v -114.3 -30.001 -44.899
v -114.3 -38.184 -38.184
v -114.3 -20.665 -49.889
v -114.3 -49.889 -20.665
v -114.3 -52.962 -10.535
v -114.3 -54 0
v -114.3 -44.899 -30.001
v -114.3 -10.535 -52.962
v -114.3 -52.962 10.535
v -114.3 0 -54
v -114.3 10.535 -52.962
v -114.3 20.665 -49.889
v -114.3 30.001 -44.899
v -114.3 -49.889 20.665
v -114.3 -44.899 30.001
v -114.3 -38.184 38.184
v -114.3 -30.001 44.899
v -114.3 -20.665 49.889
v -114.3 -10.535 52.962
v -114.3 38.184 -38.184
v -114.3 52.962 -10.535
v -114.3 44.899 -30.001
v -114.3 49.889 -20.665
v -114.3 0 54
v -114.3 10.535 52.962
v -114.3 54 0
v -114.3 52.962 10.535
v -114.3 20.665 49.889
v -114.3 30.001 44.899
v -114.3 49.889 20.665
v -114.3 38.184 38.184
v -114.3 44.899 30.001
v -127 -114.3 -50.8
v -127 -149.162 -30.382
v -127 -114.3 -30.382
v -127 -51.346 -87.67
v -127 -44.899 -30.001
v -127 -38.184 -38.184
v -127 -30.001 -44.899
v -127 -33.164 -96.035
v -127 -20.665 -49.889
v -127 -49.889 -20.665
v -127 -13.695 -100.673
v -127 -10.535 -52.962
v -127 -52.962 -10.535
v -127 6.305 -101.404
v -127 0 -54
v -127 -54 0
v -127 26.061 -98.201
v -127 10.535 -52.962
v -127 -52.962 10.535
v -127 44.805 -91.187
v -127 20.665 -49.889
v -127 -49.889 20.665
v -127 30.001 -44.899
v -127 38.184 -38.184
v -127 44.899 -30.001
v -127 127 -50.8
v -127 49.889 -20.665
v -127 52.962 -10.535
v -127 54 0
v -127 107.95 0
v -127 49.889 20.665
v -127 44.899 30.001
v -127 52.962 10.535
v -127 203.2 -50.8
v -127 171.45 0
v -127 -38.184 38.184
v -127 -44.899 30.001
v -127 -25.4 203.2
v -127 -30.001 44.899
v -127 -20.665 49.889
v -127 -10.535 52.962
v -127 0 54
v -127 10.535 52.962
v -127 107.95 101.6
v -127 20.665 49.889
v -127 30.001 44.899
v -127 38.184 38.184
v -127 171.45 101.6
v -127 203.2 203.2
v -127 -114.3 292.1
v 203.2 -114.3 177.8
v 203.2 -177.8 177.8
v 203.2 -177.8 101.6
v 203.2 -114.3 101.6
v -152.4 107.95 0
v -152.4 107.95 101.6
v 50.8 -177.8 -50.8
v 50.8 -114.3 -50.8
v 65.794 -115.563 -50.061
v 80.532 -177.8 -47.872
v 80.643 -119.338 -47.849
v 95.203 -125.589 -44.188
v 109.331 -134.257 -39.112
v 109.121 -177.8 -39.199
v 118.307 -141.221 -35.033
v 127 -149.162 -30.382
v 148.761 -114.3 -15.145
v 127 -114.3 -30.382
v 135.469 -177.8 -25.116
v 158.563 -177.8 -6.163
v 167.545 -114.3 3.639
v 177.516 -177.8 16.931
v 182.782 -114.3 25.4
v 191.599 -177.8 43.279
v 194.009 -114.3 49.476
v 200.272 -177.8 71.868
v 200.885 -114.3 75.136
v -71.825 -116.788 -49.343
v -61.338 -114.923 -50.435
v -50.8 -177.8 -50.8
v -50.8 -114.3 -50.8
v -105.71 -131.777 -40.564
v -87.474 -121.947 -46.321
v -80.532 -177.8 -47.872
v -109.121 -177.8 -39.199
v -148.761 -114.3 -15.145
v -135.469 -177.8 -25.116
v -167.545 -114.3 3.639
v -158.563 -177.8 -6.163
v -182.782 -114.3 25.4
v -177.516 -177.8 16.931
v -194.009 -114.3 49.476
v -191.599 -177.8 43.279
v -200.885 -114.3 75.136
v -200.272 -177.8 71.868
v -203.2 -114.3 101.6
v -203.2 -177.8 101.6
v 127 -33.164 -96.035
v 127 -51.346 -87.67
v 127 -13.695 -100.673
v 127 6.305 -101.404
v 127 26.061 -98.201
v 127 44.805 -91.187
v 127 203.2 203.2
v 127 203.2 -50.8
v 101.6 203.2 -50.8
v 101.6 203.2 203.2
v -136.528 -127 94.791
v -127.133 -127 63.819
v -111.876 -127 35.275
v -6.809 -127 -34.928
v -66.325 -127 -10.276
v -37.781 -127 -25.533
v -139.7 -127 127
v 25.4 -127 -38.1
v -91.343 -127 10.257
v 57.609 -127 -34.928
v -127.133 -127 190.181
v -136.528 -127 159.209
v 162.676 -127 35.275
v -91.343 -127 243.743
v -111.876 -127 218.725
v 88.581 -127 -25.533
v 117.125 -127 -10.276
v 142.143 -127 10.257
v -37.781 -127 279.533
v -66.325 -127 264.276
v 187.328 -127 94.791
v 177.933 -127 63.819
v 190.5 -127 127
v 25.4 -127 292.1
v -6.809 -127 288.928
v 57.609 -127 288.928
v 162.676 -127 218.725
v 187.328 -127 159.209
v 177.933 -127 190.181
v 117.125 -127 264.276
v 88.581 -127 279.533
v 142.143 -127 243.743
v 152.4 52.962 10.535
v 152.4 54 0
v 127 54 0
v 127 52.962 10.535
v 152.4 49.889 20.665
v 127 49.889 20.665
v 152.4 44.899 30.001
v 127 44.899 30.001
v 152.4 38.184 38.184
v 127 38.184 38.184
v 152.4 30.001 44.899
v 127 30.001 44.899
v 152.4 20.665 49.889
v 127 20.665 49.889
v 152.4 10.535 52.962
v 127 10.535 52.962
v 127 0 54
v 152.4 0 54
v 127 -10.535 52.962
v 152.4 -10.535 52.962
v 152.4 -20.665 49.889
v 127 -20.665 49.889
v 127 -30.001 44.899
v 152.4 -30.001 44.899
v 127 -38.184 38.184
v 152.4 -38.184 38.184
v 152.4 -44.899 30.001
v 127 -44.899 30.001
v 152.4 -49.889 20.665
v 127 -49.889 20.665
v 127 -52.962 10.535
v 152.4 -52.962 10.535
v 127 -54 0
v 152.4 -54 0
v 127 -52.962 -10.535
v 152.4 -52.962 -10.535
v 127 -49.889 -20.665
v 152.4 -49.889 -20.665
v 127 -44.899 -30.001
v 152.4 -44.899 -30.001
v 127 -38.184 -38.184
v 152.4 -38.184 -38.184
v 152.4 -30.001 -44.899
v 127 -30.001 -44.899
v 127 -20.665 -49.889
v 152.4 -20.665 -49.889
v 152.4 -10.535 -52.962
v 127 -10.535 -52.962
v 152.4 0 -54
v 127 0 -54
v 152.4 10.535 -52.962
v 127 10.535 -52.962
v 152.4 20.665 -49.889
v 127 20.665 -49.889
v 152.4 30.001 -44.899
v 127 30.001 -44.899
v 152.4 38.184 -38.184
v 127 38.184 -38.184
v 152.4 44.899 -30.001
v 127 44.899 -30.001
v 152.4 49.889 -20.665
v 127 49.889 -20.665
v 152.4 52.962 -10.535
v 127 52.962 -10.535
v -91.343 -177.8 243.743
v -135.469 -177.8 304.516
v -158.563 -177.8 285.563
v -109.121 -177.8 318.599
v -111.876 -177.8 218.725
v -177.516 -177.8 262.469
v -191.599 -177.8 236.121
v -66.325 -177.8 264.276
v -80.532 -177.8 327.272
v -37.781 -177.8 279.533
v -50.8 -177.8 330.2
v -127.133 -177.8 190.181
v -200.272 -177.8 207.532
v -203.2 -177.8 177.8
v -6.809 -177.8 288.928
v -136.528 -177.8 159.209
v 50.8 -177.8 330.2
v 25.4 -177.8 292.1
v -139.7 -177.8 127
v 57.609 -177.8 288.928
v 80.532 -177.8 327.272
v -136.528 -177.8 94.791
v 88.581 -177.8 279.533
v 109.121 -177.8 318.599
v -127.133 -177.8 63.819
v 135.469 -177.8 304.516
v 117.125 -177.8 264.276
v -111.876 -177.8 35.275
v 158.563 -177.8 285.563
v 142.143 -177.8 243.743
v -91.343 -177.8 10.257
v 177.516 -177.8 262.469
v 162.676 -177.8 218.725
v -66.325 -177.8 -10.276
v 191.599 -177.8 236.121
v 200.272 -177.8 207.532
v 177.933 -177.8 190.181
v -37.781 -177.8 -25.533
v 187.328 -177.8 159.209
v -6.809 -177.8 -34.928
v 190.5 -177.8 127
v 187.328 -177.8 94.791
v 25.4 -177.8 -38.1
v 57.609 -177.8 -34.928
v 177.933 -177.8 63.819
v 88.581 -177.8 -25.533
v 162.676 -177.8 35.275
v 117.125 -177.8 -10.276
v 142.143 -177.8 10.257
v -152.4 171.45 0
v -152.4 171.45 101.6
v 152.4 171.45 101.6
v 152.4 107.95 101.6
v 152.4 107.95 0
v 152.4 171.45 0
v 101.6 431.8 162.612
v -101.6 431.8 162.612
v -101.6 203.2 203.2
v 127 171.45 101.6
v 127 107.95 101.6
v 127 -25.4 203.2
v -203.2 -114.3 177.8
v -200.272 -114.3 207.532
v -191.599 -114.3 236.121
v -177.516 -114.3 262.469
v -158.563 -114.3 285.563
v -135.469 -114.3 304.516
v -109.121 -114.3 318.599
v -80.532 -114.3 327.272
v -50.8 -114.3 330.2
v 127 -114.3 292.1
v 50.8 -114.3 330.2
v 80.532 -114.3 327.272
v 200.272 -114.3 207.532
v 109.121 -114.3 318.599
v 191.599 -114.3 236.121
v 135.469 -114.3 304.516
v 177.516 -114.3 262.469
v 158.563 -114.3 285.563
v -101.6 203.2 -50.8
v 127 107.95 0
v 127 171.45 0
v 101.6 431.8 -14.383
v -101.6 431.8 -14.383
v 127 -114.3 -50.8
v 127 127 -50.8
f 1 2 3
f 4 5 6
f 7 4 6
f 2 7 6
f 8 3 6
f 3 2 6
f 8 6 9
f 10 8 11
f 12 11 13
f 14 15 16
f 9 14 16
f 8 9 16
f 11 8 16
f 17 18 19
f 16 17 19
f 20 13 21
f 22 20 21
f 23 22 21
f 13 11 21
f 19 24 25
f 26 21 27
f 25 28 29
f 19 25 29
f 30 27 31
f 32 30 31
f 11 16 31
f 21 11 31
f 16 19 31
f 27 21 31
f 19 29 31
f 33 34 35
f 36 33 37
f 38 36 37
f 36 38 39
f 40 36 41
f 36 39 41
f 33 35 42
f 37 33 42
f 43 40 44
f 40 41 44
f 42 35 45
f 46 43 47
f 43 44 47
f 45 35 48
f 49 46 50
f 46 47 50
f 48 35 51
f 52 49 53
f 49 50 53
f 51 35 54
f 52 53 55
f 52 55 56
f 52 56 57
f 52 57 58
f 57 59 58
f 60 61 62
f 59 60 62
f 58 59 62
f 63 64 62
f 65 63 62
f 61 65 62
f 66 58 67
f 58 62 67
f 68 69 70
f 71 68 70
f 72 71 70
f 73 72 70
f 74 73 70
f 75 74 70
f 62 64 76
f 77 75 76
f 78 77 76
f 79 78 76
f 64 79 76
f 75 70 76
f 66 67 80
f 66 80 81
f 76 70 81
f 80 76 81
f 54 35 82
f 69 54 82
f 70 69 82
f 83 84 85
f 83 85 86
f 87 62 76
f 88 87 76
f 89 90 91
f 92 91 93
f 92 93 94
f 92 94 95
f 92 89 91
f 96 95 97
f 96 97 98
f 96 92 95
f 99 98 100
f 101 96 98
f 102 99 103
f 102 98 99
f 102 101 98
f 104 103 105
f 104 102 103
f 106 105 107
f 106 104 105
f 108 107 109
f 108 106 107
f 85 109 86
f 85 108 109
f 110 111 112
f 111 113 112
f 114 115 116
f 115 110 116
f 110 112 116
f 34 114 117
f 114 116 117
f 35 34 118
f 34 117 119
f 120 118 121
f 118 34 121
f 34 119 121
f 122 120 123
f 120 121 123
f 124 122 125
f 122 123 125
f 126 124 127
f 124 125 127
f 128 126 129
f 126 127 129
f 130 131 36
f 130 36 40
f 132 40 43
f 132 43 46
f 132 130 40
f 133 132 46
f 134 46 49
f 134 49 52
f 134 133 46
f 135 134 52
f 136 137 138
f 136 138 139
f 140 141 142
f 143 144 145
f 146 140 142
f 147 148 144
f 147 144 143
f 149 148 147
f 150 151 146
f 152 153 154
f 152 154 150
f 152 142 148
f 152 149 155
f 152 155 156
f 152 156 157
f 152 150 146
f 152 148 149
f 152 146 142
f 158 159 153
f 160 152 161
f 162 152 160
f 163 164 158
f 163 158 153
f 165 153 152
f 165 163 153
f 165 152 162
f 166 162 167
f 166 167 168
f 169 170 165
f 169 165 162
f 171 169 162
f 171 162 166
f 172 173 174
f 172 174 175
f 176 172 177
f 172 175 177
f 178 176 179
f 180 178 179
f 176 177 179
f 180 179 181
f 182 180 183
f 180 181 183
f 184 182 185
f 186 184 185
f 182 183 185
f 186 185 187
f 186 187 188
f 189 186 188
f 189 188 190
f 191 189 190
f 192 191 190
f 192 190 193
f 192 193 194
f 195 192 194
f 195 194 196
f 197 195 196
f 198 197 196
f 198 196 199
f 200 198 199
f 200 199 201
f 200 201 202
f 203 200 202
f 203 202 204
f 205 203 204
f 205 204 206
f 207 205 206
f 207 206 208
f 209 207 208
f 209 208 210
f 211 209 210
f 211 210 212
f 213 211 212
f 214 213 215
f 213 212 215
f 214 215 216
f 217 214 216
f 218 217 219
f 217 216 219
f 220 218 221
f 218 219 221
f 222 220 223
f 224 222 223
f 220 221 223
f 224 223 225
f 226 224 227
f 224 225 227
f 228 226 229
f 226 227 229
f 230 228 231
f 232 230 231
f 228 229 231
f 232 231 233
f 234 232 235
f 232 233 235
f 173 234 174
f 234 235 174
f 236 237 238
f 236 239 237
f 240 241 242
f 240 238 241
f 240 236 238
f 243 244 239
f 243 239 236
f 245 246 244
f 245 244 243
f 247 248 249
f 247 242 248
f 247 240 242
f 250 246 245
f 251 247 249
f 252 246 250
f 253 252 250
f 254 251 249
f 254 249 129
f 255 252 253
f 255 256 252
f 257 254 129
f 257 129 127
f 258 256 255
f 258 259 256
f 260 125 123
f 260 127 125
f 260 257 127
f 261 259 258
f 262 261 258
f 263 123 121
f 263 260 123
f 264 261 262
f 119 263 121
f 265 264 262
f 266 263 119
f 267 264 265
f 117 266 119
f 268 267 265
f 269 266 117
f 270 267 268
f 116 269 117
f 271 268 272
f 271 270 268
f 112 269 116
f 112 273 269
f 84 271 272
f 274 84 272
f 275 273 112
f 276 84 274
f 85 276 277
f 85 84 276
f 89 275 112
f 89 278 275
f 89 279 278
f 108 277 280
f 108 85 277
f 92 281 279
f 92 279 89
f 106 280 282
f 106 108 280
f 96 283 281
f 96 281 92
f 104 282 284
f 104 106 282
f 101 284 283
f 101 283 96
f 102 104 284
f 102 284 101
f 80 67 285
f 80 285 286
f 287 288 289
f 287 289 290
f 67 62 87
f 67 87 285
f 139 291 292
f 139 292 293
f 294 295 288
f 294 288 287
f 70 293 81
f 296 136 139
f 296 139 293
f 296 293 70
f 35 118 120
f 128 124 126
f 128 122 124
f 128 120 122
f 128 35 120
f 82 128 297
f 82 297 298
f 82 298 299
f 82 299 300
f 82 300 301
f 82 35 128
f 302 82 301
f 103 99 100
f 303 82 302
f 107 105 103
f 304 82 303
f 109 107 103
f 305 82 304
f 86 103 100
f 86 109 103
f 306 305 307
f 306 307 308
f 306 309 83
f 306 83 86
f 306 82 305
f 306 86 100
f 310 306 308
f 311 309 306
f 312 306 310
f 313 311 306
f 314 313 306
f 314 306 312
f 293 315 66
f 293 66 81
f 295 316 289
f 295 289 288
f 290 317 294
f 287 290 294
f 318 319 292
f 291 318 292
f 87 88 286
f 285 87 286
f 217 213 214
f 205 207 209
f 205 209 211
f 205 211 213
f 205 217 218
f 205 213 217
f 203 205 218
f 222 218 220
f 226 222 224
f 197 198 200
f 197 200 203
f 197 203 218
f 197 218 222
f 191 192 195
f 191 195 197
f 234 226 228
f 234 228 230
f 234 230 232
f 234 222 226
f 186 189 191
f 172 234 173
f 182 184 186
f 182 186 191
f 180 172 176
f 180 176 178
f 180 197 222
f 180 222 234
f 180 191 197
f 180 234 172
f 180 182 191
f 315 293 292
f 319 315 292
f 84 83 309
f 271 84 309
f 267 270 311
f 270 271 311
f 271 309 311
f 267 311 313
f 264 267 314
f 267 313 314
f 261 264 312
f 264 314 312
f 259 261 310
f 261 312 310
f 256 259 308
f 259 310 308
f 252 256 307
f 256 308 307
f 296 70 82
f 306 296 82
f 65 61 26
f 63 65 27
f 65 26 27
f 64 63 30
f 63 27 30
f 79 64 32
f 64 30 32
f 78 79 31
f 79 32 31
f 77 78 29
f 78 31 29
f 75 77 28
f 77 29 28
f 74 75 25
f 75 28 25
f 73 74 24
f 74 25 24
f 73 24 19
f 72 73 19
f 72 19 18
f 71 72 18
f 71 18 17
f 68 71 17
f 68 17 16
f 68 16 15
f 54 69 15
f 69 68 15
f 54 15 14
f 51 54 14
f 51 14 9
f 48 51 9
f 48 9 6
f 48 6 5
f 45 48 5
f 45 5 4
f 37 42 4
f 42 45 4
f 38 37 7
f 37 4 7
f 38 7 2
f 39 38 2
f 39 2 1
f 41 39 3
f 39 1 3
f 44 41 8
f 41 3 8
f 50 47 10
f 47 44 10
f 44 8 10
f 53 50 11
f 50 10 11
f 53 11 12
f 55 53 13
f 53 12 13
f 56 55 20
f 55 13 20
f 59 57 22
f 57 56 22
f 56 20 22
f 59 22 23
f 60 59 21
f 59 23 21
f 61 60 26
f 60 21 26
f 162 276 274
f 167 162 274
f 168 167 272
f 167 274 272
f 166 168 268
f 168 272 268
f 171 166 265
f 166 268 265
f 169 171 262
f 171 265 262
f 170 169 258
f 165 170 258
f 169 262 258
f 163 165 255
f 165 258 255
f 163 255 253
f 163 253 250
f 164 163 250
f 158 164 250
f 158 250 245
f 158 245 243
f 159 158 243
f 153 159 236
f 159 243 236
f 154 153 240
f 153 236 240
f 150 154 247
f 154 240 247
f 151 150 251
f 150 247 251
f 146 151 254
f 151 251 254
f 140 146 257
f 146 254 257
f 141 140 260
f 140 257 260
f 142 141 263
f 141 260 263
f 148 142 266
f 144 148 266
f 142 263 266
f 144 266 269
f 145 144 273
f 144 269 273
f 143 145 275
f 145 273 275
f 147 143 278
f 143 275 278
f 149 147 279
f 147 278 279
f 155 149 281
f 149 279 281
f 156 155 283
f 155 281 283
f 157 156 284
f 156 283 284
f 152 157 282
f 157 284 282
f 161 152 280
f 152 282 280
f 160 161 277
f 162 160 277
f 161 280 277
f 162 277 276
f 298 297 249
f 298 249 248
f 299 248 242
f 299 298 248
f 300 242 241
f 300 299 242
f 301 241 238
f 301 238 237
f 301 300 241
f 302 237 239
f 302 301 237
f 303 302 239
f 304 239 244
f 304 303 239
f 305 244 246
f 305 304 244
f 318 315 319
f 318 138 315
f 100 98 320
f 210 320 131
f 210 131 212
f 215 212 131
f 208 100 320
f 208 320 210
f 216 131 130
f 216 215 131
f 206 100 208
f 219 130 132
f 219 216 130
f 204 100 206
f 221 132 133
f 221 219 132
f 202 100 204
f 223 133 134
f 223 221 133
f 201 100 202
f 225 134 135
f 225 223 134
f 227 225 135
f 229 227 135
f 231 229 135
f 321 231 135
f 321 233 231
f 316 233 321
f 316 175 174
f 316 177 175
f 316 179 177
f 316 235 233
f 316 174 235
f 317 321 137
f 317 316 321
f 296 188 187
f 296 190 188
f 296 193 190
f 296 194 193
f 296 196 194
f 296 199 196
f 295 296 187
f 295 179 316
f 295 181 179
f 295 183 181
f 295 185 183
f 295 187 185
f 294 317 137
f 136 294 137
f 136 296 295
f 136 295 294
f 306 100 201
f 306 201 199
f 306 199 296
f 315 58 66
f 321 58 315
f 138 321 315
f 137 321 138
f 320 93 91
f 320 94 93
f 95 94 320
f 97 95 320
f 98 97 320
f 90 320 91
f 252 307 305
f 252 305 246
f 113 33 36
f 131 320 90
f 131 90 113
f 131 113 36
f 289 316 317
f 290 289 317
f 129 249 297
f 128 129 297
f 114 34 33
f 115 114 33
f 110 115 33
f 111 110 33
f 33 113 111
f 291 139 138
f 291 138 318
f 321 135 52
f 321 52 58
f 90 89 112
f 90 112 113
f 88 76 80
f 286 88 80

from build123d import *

# Parameters (mm, degrees)
F1_DEPTH      = 203.2
F1_DEPTH_BACK = 203.2
F0_W          = 63.5
F0_H          = 101.6
F0_R          = 54
F2_DEPTH      = 127
F2_DEPTH_BACK = 127
F3_DEPTH      = 101.6
F3_DEPTH_BACK = 101.6
F4_DEPTH      = 152.4
F4_DEPTH_BACK = 114.3
F5_T1_DEPTH   = 825.5
F5_T6_DEPTH   = 825.5
F5_T11_DEPTH  = 444.5
F5_T16_DEPTH  = 825.5
F5_T21_DEPTH  = 825.5
F6_DEPTH      = 152.4
F6_DEPTH_BACK = 152.4
F7_R          = 165.1
F8_DEPTH      = 50.8


# Not quite as in the source:
# - a fillet or chamfer that OpenCascade refuses, or shapes differently, is made with other operations: its cross-section is extruded or revolved along the edge and cut away or added


with BuildPart() as f1:
    # F0 (on Right) → F1 (new body, two sides)
    with BuildSketch(Plane.YZ) as f1_sk:
        Polygon((-177.8, -50.8), (-114.3, -50.8), (-114.3, 292.1), (-114.3, 330.2), (-177.8, 330.2), align=None)
    extrude(amount=F1_DEPTH)
    extrude(f1_sk.sketch, amount=-F1_DEPTH_BACK)

    # F0 (on Right) → F2 (join, two sides)
    with BuildSketch(Plane.YZ) as f2_sk:
        with BuildLine():
            ThreePointArc((-51.3464921696, -87.6703926185), (-50.5260150594, 88.1457985511), (101.6, 0))
            ThreePointArc((101.6, 0), (86.2402819365, -53.7138136006), (44.8052407181, -91.1868982047))
            Line((44.8052407181, -91.1868982047), (127, -50.8))
            Line((127, -50.8), (203.2, -50.8))
            Line((203.2, -50.8), (203.2, 203.2))
            Line((203.2, 203.2), (-25.4, 203.2))
            Line((-25.4, 203.2), (-114.3, 292.1))
            Line((-114.3, 292.1), (-114.3, -50.8))
            Line((-114.3, -50.8), (-51.3464921696, -87.6703926185))
        make_face()
        with Locations((139.7, 50.8)):
            Rectangle(F0_W, F0_H, mode=Mode.SUBTRACT)
        with BuildLine():
            ThreePointArc((44.8052407181, -91.1868982047), (86.2402819365, -53.7138136006), (101.6, 0))
            ThreePointArc((101.6, 0), (-50.5260150594, 88.1457985511), (-51.3464921696, -87.6703926185))
            ThreePointArc((-51.3464921696, -87.6703926185), (-3.7132796181, -101.5321208016), (44.8052407181, -91.1868982047))
        make_face()
        Circle(F0_R, mode=Mode.SUBTRACT)
    extrude(amount=F2_DEPTH)
    extrude(f2_sk.sketch, amount=-F2_DEPTH_BACK)

    # F0 (on Right) → F3 (join, two sides)
    with BuildSketch(Plane.YZ) as f3_sk:
        Polygon((203.2, 203.2), (203.2, -50.8), (431.8, -14.3826426938), (431.8, 162.6118868589), align=None)
    extrude(amount=F3_DEPTH)
    extrude(f3_sk.sketch, amount=-F3_DEPTH_BACK)

    # F0 (on Right) → F4 (join, two sides)
    with BuildSketch(Plane.YZ) as f4_sk:
        Circle(F0_R)
    extrude(amount=F4_DEPTH)
    extrude(f4_sk.sketch, amount=-F4_DEPTH_BACK)

    # F5: fillet of radius 152.4 on 4 edges, made by hand

    # F5_s2 → F5_t1 (cut)
    with BuildSketch(Plane.XZ.offset(-266.7)):
        with BuildLine():
            ThreePointArc((203.2, 177.8), (158.5630734528, 285.5630734528), (50.8, 330.2))
            Line((50.8, 330.2), (203.2, 330.2))
            Line((203.2, 330.2), (203.2, 177.8))
        make_face()
        with BuildLine():
            ThreePointArc((-203.2, 177.8), (-158.5630734528, 285.5630734528), (-50.8, 330.2))
            Line((-50.8, 330.2), (-203.2, 330.2))
            Line((-203.2, 330.2), (-203.2, 177.8))
        make_face()
    extrude(amount=F5_T1_DEPTH, mode=Mode.SUBTRACT)


with BuildPart() as f5_tool4:
    # F5_s5 → F5_t6 (new body)
    with BuildSketch(Plane.XZ.offset(558.8)):
        with BuildLine():
            ThreePointArc((50.8, -50.8), (158.5630734528, -6.1630734528), (203.2, 101.6))
            Line((203.2, 101.6), (203.2, -50.8))
            Line((203.2, -50.8), (50.8, -50.8))
        make_face()
    extrude(amount=-F5_T6_DEPTH)

    split(bisect_by=Plane(origin=(0, -51.3464921696, -87.6703926185), x_dir=(1, 0, 0), z_dir=(0, -0.5053788599, -0.8628975651)), keep=Keep.TOP)


with BuildPart() as f1_1:
    add(f1.part)

    # F5_t3: cut F5_tool4
    add(f5_tool4.part, mode=Mode.SUBTRACT)


with BuildPart() as f5_tool9:
    # F5_s10 → F5_t11 (new body)
    with BuildSketch(Plane.XZ.offset(558.8)):
        with BuildLine():
            ThreePointArc((50.8, -50.8), (158.5630734528, -6.1630734528), (203.2, 101.6))
            Line((203.2, 101.6), (203.2, -50.8))
            Line((203.2, -50.8), (50.8, -50.8))
        make_face()
    extrude(amount=-F5_T11_DEPTH)

    split(bisect_by=Plane.YZ.offset(127), keep=Keep.TOP)


with BuildPart() as f1_2:
    add(f1_1.part)

    # F5_t8: cut F5_tool9
    add(f5_tool9.part, mode=Mode.SUBTRACT)


with BuildPart() as f5_tool14:
    # F5_s15 → F5_t16 (new body)
    with BuildSketch(Plane.XZ.offset(558.8)):
        with BuildLine():
            ThreePointArc((-50.8, -50.8), (-158.5630734528, -6.1630734528), (-203.2, 101.6))
            Line((-203.2, 101.6), (-203.2, -50.8))
            Line((-203.2, -50.8), (-50.8, -50.8))
        make_face()
    extrude(amount=-F5_T16_DEPTH)

    split(bisect_by=Plane(origin=(0, -51.3464921696, -87.6703926185), x_dir=(1, 0, 0), z_dir=(0, -0.5053788599, -0.8628975651)), keep=Keep.TOP)


with BuildPart() as f1_3:
    add(f1_2.part)

    # F5_t13: cut F5_tool14
    add(f5_tool14.part, mode=Mode.SUBTRACT)


with BuildPart() as f5_tool19:
    # F5_s20 → F5_t21 (new body)
    with BuildSketch(Plane.XZ.offset(558.8)):
        with BuildLine():
            ThreePointArc((-50.8, -50.8), (-158.5630734528, -6.1630734528), (-203.2, 101.6))
            Line((-203.2, 101.6), (-203.2, -50.8))
            Line((-203.2, -50.8), (-50.8, -50.8))
        make_face()
    extrude(amount=-F5_T21_DEPTH)

    split(bisect_by=Plane.YZ.offset(-127), keep=Keep.BOTTOM)


with BuildPart() as f1_4:
    add(f1_3.part)

    # F5_t18: cut F5_tool19
    add(f5_tool19.part, mode=Mode.SUBTRACT)

    # F0 (on Right) → F6 (join, two sides)
    with BuildSketch(Plane.YZ) as f6_sk:
        with Locations((139.7, 50.8)):
            Rectangle(F0_W, F0_H)
    extrude(amount=F6_DEPTH)
    extrude(f6_sk.sketch, amount=-F6_DEPTH_BACK)

    # F7 (on face) → F8 (cut)
    with BuildSketch(Plane.XZ.offset(177.8)):
        with Locations((25.4, 127)):
            Circle(F7_R)
    extrude(amount=-F8_DEPTH, mode=Mode.SUBTRACT)


solid = f1_4.part
